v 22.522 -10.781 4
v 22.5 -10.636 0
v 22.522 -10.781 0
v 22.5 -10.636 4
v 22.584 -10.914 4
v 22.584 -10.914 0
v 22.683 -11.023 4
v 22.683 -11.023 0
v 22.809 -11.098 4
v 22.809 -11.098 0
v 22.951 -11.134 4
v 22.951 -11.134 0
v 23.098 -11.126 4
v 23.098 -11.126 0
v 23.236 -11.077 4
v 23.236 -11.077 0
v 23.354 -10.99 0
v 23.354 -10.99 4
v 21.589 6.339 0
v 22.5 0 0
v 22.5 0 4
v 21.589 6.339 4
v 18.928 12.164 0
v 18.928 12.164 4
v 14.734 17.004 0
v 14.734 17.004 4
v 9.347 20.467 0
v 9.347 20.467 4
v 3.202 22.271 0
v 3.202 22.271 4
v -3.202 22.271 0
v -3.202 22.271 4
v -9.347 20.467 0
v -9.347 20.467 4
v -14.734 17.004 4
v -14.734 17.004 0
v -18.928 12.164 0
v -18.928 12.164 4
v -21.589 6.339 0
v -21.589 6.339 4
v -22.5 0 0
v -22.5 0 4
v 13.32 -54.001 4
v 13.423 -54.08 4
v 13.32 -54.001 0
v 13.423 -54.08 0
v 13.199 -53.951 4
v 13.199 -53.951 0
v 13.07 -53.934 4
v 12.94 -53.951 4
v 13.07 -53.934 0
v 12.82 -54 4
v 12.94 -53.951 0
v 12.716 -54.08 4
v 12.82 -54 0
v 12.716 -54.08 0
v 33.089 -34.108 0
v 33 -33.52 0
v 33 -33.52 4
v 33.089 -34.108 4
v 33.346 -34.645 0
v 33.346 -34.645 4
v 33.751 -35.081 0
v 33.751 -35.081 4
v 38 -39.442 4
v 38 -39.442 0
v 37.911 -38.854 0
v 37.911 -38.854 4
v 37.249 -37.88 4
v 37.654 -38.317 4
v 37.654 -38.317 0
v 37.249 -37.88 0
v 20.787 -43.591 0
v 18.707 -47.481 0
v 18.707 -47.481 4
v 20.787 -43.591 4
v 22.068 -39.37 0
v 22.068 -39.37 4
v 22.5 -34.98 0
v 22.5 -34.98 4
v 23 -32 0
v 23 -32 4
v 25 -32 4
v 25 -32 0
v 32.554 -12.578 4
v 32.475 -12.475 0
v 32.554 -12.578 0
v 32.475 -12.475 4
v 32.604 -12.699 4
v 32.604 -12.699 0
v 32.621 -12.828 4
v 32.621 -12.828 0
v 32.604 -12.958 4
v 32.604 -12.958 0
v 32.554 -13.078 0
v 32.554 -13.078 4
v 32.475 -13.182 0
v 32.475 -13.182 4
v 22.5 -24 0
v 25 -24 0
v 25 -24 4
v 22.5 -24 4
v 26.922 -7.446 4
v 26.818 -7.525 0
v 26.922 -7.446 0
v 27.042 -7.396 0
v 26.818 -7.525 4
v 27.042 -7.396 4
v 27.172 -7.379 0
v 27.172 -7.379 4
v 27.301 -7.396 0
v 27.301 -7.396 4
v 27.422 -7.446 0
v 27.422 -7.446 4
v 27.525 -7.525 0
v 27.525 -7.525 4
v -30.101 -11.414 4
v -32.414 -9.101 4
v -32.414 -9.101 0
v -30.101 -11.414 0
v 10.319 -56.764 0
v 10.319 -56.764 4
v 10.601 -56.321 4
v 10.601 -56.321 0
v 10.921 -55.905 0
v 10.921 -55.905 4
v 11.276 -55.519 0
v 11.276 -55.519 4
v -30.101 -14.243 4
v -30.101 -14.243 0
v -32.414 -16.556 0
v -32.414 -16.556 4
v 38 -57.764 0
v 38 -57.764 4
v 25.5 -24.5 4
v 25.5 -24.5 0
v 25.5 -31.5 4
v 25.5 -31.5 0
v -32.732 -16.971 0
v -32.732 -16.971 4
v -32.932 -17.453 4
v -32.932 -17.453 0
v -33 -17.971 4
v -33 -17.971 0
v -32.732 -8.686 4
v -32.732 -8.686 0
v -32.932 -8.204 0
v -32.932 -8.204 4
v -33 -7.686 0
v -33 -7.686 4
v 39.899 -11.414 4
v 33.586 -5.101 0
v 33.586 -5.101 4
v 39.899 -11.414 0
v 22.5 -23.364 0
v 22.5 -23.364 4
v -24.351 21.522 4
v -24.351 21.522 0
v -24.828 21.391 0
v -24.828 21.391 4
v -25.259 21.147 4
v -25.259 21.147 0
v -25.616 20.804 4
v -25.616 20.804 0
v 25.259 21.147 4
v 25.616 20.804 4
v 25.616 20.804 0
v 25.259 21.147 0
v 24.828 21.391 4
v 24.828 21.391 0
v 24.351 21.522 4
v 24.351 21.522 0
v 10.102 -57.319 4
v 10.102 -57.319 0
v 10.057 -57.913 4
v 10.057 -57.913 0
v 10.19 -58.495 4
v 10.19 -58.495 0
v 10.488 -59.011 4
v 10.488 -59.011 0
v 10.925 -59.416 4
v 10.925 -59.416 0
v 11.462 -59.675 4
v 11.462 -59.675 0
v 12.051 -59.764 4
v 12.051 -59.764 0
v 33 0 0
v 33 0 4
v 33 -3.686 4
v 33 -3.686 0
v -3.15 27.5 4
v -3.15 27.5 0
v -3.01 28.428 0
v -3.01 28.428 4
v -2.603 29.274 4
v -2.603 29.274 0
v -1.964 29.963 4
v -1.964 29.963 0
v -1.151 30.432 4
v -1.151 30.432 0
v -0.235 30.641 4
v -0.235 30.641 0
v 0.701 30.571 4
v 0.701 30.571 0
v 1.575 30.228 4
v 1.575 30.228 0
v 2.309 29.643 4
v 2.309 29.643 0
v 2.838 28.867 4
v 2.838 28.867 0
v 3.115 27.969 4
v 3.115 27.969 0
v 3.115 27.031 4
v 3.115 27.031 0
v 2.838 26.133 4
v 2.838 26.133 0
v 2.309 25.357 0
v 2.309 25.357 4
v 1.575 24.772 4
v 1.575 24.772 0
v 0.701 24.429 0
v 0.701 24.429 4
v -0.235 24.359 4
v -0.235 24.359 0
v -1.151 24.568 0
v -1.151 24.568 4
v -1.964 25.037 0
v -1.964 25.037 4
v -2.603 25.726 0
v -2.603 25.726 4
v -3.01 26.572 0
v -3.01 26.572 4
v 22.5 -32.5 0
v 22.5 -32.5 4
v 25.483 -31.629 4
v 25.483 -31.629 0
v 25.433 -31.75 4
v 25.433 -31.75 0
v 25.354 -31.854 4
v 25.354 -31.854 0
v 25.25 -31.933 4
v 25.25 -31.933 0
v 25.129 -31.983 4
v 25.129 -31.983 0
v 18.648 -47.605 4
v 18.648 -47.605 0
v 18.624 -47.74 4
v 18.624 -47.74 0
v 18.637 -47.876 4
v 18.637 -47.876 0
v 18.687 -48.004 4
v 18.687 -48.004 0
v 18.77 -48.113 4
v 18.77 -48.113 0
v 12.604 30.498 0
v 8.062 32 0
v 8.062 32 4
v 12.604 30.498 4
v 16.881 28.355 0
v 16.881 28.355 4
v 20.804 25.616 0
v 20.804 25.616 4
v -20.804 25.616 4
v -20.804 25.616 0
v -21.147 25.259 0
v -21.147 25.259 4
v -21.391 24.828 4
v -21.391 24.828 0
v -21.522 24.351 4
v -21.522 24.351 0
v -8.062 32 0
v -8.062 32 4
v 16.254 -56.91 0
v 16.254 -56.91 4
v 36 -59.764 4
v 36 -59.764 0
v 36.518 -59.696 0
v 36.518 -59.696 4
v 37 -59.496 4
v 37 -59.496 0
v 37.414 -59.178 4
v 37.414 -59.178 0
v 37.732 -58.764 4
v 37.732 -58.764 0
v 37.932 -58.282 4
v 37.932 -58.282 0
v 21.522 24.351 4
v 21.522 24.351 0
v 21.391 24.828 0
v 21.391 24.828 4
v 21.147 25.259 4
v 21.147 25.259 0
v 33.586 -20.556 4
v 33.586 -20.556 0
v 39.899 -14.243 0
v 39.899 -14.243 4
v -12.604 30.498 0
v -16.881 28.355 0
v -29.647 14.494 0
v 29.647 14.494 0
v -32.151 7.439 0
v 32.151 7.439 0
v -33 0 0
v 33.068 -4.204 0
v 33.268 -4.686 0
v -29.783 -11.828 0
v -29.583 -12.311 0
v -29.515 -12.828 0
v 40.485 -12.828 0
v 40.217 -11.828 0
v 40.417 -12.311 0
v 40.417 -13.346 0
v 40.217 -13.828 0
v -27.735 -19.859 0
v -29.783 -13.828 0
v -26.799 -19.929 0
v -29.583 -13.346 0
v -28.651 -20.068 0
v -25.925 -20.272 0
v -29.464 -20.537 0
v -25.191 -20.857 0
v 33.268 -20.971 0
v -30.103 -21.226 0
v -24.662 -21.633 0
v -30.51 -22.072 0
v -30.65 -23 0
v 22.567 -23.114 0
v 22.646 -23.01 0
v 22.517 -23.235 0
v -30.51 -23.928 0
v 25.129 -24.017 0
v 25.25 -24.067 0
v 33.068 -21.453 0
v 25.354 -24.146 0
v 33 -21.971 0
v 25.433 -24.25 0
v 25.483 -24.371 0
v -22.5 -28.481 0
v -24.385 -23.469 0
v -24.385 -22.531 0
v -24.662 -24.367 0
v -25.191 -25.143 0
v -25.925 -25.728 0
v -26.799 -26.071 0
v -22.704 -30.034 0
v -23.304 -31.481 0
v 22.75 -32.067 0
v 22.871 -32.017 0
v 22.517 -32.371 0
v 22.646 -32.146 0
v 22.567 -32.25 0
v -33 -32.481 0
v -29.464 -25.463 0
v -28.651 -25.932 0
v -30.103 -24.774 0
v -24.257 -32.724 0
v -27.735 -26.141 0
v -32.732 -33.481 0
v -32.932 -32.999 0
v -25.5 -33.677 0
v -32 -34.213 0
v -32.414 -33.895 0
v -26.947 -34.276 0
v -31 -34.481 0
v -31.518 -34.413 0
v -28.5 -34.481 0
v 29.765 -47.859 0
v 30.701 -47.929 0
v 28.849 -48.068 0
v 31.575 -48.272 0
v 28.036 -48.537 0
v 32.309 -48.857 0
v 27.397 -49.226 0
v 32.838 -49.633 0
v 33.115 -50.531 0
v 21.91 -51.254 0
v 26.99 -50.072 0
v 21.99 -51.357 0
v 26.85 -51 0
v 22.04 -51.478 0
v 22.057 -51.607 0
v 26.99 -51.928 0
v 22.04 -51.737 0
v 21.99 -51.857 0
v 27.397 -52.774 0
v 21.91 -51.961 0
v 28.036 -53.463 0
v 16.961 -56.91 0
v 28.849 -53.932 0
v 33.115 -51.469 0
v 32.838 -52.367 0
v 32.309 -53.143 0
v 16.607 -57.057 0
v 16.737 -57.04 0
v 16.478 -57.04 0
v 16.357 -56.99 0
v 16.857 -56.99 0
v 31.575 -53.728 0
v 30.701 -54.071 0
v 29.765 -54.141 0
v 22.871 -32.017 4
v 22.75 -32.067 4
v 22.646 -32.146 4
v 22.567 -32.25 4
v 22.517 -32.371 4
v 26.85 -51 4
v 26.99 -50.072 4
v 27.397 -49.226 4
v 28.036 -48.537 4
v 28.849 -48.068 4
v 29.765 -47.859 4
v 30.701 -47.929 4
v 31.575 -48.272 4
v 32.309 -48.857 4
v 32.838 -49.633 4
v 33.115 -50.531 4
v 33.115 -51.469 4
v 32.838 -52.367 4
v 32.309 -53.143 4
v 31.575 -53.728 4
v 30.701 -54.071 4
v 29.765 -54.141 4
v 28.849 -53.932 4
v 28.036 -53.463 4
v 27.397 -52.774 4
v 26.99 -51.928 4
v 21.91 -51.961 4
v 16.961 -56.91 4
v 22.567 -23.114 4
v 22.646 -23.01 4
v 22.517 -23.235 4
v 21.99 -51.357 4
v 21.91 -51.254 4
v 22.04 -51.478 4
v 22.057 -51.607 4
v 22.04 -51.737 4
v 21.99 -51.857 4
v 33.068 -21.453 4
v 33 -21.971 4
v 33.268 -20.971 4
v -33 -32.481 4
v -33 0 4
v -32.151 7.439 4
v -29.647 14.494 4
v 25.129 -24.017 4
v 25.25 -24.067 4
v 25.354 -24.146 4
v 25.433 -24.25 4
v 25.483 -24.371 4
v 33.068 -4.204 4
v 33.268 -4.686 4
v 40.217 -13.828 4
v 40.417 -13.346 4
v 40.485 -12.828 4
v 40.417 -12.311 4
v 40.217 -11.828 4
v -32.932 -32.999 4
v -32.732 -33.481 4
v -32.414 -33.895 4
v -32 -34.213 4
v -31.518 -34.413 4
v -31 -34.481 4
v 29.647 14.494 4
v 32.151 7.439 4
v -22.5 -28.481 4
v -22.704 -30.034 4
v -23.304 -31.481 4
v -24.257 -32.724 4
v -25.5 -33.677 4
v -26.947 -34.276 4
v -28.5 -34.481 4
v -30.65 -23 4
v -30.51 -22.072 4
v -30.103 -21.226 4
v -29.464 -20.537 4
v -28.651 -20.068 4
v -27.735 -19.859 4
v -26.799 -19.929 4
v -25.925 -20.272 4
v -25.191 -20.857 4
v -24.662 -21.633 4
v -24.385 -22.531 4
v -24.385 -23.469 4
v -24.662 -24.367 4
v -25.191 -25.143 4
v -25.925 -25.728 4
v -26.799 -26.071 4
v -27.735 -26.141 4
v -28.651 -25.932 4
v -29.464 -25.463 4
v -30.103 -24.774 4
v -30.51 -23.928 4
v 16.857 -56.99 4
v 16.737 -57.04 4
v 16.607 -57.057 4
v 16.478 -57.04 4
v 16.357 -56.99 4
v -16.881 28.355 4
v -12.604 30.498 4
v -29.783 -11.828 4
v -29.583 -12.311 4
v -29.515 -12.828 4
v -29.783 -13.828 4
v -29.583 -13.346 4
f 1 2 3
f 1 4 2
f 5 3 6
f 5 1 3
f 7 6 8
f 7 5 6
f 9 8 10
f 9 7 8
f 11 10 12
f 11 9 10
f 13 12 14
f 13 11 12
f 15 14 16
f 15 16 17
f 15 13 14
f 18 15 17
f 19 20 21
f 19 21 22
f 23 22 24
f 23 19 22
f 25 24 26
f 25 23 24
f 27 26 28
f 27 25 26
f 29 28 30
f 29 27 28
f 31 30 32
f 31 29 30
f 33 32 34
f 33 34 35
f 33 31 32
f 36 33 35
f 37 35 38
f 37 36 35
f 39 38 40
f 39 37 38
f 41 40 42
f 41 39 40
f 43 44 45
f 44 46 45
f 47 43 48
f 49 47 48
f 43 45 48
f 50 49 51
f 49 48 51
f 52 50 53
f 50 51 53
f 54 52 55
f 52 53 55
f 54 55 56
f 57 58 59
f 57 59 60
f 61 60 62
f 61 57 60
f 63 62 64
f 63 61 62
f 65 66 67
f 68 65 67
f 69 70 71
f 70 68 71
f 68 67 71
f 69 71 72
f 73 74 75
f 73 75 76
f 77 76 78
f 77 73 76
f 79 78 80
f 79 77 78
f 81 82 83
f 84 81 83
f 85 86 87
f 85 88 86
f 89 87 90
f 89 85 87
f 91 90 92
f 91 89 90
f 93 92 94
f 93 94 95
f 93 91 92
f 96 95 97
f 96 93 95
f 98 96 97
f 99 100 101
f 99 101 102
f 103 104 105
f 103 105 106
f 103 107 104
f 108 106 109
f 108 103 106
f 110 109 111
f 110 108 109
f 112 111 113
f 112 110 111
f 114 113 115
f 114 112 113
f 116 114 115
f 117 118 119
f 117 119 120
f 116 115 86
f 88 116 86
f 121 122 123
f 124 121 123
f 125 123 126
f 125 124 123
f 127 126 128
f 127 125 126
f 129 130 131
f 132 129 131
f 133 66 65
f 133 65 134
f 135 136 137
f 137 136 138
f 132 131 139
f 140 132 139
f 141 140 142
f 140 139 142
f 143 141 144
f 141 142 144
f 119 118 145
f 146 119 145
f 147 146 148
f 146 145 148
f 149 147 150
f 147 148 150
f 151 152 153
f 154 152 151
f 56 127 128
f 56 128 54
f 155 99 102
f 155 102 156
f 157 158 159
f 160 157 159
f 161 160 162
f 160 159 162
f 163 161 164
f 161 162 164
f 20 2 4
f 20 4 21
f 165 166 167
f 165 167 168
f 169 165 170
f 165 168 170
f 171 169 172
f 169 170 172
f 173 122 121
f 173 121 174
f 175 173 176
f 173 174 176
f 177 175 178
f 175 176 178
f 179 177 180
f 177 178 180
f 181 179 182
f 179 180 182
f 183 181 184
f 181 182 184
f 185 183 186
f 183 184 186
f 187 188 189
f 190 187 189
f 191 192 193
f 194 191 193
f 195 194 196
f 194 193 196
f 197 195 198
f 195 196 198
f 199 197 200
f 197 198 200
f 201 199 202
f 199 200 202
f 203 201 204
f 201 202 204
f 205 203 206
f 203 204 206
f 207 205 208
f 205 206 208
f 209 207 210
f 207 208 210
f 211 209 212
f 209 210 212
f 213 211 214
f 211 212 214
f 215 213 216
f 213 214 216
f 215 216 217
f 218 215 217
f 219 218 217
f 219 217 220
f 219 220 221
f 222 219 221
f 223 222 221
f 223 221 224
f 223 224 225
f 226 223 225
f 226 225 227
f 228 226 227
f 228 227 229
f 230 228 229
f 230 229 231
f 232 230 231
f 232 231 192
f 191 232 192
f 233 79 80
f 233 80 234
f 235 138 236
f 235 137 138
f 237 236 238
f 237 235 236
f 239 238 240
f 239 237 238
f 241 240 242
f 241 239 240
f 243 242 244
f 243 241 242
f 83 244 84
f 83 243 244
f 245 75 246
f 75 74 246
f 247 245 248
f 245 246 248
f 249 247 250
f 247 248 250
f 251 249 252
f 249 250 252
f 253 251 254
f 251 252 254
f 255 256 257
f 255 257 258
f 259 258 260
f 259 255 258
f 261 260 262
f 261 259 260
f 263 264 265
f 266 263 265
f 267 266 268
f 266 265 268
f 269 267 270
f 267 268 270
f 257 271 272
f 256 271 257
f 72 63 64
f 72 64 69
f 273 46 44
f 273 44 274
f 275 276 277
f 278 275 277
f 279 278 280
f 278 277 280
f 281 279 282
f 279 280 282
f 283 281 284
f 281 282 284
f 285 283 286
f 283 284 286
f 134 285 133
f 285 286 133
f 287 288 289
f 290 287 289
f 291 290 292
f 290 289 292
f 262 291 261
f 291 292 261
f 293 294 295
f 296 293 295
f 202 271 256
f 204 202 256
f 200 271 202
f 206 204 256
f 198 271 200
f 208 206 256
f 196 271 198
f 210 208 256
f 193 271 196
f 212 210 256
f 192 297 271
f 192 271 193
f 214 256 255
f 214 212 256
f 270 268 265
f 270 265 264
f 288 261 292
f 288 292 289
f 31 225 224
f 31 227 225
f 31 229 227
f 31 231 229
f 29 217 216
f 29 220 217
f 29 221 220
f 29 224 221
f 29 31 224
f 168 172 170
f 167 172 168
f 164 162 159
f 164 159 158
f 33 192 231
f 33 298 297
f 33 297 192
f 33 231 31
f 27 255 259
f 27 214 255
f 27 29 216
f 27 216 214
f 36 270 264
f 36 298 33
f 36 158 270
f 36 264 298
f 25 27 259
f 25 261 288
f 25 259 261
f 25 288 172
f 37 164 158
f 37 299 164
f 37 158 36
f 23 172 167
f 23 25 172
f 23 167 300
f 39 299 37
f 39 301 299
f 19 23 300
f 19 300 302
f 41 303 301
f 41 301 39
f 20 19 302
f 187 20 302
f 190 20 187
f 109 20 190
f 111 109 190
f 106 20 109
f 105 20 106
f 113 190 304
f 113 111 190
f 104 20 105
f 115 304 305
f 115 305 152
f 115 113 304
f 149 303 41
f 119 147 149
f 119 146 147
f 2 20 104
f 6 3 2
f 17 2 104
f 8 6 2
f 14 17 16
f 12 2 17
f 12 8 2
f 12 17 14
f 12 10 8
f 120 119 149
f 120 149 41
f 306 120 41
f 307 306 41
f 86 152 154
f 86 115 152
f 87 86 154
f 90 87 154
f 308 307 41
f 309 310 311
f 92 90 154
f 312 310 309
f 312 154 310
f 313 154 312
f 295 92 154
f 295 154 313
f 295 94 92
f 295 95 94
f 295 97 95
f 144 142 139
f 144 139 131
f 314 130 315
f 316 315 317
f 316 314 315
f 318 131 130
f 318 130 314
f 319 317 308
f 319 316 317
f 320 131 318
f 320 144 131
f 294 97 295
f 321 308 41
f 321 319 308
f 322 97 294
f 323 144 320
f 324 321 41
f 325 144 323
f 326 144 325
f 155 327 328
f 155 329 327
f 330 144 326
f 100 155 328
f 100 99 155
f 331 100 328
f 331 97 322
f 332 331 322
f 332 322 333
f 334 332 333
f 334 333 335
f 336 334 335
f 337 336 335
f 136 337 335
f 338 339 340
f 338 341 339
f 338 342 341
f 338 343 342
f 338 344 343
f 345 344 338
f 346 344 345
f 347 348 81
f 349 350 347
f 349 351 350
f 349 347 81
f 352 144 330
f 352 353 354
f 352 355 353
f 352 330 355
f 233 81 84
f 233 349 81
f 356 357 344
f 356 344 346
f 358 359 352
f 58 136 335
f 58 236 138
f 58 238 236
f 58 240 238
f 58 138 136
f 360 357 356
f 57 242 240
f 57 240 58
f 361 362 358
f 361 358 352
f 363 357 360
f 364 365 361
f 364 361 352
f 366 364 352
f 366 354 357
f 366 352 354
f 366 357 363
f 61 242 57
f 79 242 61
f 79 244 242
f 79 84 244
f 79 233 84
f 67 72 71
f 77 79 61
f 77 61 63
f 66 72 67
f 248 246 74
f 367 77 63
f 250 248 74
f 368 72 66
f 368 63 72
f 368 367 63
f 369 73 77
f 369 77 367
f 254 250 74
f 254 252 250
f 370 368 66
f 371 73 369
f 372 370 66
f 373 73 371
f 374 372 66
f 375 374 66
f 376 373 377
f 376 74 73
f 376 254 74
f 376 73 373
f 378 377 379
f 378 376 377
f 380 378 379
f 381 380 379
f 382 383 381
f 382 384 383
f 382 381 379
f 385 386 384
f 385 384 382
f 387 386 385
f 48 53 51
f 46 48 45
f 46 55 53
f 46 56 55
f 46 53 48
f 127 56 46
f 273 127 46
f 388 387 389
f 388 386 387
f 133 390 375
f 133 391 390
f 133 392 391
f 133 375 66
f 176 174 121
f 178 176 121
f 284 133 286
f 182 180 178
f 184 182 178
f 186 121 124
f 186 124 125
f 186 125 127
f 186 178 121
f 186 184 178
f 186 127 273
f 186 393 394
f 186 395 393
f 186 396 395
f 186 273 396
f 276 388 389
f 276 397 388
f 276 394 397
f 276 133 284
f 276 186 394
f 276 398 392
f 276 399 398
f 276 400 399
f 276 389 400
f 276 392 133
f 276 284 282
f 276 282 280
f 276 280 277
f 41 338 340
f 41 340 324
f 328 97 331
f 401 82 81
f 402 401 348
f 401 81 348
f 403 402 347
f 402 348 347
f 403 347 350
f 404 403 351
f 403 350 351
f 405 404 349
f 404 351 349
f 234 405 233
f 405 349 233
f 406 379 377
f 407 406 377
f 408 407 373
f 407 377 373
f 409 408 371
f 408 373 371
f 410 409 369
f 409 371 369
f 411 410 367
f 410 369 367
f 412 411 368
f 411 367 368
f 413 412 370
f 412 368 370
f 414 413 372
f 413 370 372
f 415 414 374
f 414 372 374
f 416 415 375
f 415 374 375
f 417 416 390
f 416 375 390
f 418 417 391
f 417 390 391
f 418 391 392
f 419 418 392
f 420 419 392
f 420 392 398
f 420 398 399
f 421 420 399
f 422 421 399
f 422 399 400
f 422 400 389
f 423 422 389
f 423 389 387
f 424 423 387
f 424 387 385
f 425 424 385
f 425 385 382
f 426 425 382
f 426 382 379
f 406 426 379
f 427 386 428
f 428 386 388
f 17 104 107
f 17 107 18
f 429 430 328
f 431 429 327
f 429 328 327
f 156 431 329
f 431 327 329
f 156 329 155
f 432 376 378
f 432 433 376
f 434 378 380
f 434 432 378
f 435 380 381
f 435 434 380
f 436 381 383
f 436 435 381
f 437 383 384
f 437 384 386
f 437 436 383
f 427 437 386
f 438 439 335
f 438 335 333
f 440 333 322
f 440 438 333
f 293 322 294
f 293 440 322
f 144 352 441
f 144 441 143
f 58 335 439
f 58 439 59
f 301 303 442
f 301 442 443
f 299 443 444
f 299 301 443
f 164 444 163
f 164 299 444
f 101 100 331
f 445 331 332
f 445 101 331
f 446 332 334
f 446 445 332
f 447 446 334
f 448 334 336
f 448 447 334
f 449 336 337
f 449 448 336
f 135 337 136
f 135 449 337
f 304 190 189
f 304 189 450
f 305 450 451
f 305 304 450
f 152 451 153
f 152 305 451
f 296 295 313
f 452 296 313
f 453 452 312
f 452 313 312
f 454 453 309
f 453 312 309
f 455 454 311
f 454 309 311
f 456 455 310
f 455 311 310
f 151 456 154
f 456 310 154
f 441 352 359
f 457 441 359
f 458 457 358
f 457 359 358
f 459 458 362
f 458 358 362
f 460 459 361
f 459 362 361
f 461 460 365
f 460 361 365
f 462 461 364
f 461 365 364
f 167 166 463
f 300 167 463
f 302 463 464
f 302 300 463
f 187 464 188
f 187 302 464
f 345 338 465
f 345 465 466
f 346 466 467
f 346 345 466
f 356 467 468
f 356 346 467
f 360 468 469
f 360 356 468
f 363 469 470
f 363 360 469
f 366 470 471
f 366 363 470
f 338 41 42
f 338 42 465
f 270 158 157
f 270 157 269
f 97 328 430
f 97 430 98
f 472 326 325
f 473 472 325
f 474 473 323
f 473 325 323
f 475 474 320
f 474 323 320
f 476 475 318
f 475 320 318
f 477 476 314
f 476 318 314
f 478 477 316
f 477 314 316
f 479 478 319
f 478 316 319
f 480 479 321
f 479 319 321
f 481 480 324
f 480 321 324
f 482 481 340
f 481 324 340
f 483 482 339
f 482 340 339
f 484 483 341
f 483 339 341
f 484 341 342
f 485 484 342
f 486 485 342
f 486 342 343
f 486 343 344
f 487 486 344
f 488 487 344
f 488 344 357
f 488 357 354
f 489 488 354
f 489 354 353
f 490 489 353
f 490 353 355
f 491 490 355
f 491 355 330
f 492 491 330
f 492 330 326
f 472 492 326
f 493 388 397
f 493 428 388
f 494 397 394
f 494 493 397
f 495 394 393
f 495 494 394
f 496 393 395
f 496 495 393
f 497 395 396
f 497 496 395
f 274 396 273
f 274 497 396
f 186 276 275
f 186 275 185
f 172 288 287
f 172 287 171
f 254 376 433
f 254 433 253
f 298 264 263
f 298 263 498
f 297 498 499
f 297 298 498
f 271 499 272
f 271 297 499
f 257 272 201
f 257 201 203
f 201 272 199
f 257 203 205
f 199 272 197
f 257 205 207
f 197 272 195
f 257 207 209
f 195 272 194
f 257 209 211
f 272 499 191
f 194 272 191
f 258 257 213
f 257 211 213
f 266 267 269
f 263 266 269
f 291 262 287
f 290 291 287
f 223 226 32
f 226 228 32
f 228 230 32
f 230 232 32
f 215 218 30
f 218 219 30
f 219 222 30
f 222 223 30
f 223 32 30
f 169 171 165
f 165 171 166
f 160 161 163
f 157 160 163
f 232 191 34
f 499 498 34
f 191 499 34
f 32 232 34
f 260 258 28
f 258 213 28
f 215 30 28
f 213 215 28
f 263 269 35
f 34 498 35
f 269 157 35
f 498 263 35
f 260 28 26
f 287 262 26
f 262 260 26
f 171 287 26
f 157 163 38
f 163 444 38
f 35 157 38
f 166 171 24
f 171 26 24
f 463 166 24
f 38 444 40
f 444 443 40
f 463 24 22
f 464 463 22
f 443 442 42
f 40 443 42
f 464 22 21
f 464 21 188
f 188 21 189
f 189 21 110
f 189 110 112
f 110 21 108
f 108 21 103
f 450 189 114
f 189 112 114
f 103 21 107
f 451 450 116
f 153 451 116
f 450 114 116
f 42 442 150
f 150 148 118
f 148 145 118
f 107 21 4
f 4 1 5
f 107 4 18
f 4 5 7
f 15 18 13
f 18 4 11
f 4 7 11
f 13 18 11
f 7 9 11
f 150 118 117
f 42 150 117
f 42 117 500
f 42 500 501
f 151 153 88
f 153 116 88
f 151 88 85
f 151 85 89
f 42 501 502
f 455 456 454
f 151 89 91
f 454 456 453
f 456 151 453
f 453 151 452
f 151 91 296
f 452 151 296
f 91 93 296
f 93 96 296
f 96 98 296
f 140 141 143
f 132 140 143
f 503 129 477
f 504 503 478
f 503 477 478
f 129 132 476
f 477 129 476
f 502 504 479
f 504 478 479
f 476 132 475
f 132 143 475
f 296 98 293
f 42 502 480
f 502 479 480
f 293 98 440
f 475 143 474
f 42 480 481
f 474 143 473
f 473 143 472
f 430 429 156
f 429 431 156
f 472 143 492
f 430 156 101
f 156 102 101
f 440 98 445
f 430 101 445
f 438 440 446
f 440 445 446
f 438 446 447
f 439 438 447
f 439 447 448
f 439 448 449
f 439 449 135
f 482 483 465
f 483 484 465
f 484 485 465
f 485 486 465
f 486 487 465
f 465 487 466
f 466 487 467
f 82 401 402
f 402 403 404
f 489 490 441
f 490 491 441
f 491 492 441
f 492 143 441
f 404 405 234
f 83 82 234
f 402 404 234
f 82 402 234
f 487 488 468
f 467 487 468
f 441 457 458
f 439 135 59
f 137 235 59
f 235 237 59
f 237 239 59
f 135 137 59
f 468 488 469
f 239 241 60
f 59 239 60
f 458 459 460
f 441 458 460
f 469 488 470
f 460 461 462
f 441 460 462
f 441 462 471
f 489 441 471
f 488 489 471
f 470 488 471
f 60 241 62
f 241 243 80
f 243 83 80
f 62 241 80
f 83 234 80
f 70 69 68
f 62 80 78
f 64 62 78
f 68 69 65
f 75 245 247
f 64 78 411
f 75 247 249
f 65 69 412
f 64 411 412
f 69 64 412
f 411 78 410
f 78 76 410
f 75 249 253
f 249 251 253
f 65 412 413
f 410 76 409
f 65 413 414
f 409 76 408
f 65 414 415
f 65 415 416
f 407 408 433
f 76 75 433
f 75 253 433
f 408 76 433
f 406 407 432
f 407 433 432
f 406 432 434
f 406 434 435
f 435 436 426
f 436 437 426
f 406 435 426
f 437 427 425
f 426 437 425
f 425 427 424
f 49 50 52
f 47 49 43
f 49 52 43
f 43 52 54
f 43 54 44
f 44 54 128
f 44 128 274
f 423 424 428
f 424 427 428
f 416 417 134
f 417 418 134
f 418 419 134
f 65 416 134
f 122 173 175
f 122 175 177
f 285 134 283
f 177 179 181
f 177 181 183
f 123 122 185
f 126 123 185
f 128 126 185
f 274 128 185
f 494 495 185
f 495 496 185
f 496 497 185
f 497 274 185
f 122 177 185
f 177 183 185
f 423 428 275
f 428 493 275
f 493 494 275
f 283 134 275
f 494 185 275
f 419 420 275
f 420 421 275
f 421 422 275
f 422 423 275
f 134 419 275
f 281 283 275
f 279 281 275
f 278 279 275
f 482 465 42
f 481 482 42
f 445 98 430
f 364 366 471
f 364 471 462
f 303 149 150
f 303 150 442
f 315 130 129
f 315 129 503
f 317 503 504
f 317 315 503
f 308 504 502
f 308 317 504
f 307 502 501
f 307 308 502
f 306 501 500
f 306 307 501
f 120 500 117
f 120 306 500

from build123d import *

# Parameters (mm, degrees)
CORPS_DEPTH                     = 4
DIAM_TRE_DU_PER_AGE_6_2_6_3_1_D = 6.3
RENFORT_CAVITE_IR_DEPTH         = 4
CAVITE_IR_DEPTH                 = 73.7636828920554
CAVITE_SWITCH_DEPTH             = 73.7636828920554
CONG_1_R                        = 2
CONG_2_R                        = 0.5


with BuildPart() as part:
    # Esquisse1 → corps (new body)
    with BuildSketch(Plane.XY):
        with BuildLine():
            Line((-21.522272155725624, 24.35069928047194), (-21.522272155725624, 25.01583101267831))
            ThreePointArc((-21.522272155725624, 25.01583101267831), (-15.198873528041206, 29.291538769388826), (-8.062257748298553, 32))
            Line((-8.062257748298553, 32), (8.062257748298553, 32))
            ThreePointArc((8.062257748298553, 32), (15.198873528041206, 29.29153876938882), (21.522272155725624, 25.015831012678305))
            Line((21.522272155725624, 25.015831012678305), (21.522272155725624, 24.350699280471943))
            Line((21.522272155725624, 24.350699280471943), (24.35069928047182, 21.522272155725762))
            Line((24.35069928047182, 21.522272155725762), (25.015831012678188, 21.522272155725762))
            ThreePointArc((25.015831012678188, 21.522272155725762), (30.93963819615851, 11.477751883135042), (33, 0))
            Line((33, 0), (33, -34.48090133377067))
            Line((33, -34.48090133377067), (38, -38.48090133377066))
            Line((38, -38.48090133377066), (38, -59.76396103067893))
            Line((38, -59.76396103067893), (9.515567427896173, -59.76396103067893))
            ThreePointArc((9.515567427896173, -59.76396103067893), (9.973004843675767, -57.46613597206372), (11.275567427896174, -55.51868129902402))
            Line((11.275567427896174, -55.51868129902402), (15.9, -50.9))
            ThreePointArc((15.9, -50.9), (20.78460969082653, -43.597044976101124), (22.500000000000004, -34.98020100629408))
            Line((22.500000000000004, -34.98020100629408), (22.5, 0))
            ThreePointArc((22.5, 0), (1.38e-15, 22.5), (-22.5, 0))
            Line((-22.5, 0), (-22.5, -28.480901333770667))
            ThreePointArc((-22.5, -28.480901333770667), (-24.257359312880713, -32.723542020889944), (-28.499999999999993, -34.48090133377067))
            Line((-28.499999999999993, -34.48090133377067), (-33, -34.48090133377067))
            Line((-33, -34.48090133377067), (-33, 0))
            ThreePointArc((-33, 0), (-30.939638196158512, 11.477751883135037), (-25.015831012678195, 21.522272155725755))
            Line((-25.015831012678195, 21.522272155725755), (-24.35069928047182, 21.52227215572576))
            Line((-24.35069928047182, 21.52227215572576), (-21.522272155725624, 24.35069928047194))
        make_face()
    extrude(amount=CORPS_DEPTH)

    # Diamètre du perçage Ø6.2 (6.3)1 (through all)
    with Locations(Plane.XY.offset(4)):
        with Locations((0, 27.5), (30, -51), (-27.5, -23)):
            Hole(DIAM_TRE_DU_PER_AGE_6_2_6_3_1_D / 2)

    # Esquisse4 → renfort_cavite_IR (add, through all)
    with BuildSketch(Plane.XY):
        Polygon((31.414213562373053, -2.928932188134515), (41.313708498984774, -12.828427124746126), (34.525483399593966, -19.61665222413702), (27.454415587728445, -26.68772003600261), (24.62598846298224, -9.717157287525408), align=None)
    extrude(amount=RENFORT_CAVITE_IR_DEPTH)

    # Esquisse4<4> → cavite_IR (cut, through all)
    with BuildSketch(Plane.XY):
        Polygon((4.3e-16, -34.34314575050794), (24.62598846298224, -9.717157287525408), (27.17157287525379, -7.171572875253825), (32.828427124746206, -12.828427124746176), (30.282842712474658, -15.37401153701776), (1.73e-15, -45.65685424949275), align=None)
        Polygon((-75.93969696196702, -31.797561338236385), (-42.82842712474626, 1.313708498984752), (-28.686291501015212, -12.828427124746126), (-61.79756133823598, -45.93969696196728), align=None)
    extrude(amount=CAVITE_IR_DEPTH, mode=Mode.SUBTRACT)

    # Esquisse5 → cavite_switch (cut, through all)
    with BuildSketch(Plane.XY):
        Polygon((18.90520382004283, -48.24834957055045), (21.910407640085666, -51.25355339059327), (22.263961030678935, -51.607106781186545), (16.607106781186562, -57.26396103067893), (16.253553390593282, -56.910407640085644), (13.24834957055045, -53.905203820042814), (12.894796179957178, -53.551650429449545), (11.671501448504449, -52.32835569799682), (17.32835569799682, -46.671501448504436), (18.55165042944955, -47.89479617995717), align=None)
        Polygon((20.249999999999996, -31.999999999999993), (18.51999999999999, -32), (18.51999999999999, -23.999999999999993), (20.249999999999996, -23.999999999999996), (20.750000000000007, -23.99999999999999), (25.000000000000007, -23.99999999999999), (25.50000000000001, -24), (25.500000000000007, -32), (25.00000000000001, -32), (20.750000000000007, -32), align=None)
    extrude(amount=CAVITE_SWITCH_DEPTH, mode=Mode.SUBTRACT)

    # Congé1
    # the kernel refuses this fillet: 2 mm, written as the material it adds along each edge
    with BuildSketch(Plane(origin=(33, -4.514718625761442, 0), x_dir=(0.7071067811865507, -0.7071067811865442, 0), z_dir=(0, 0, 1))) as cong_1_piece_1:
        with BuildLine():
            CenterArc((CONG_1_R * 0.414213562373, CONG_1_R), CONG_1_R, 224.99999999999966, 45.000000000000455)
            Line((-CONG_1_R * 0.292893218813, CONG_1_R * 0.292893218813), (0, 0))
            Line((0, 0), (CONG_1_R * 0.414213562373, 1e-17))
        make_face()
    extrude(amount=4)
    with BuildSketch(Plane(origin=(33, -21.142135623731004, 4), x_dir=(0, -1, 0), z_dir=(0, 0, -1))) as cong_1_piece_2:
        with BuildLine():
            CenterArc((CONG_1_R * 0.414213562373, -CONG_1_R), CONG_1_R, 90, 44.999999999999574)
            Line((-CONG_1_R * 0.292893218813, -CONG_1_R * 0.292893218813), (0, 0))
            Line((0, 0), (CONG_1_R * 0.414213562373, 0))
        make_face()
    extrude(amount=4)
    with BuildSketch(Plane(origin=(33, -34.48090133377067, 0), x_dir=(0.7808688094430318, -0.6246950475544225, 0), z_dir=(0, 0, 1))) as cong_1_piece_3:
        with BuildLine():
            CenterArc((CONG_1_R * 0.480624847487, CONG_1_R), CONG_1_R, 218.65980825408994, 51.34019174590992)
            Line((-CONG_1_R * 0.300243961956, CONG_1_R * 0.375304952446), (0, 0))
            Line((0, 0), (CONG_1_R * 0.480624847487, 1e-17))
        make_face()
    extrude(amount=4)
    with BuildSketch(Plane(origin=(-28.686291501015212, -12.828427124746126, 0), x_dir=(-0.7071067811865511, 0.707106781186544, 0), z_dir=(0, 0, 1))) as cong_1_piece_4:
        with BuildLine():
            CenterArc((CONG_1_R, CONG_1_R), CONG_1_R, 179.9999999999999, 90.00000000000023)
            Line((-7.52e-15, CONG_1_R), (0, 0))
            Line((0, 0), (CONG_1_R, 2e-17))
        make_face()
    extrude(amount=4)
    # the kernel refuses this fillet: 2 mm, written as the material it takes off along each edge
    with BuildSketch(Plane(origin=(-25.0158310126782, 21.52227215572575, -2.3412126230346395), x_dir=(1, 0, 0), z_dir=(0, 0, 1))) as cong_1_2_piece_1:
        with BuildLine():
            CenterArc((0.9518811347481559, -1.979336954674956), CONG_1_R, 98.24317304928408, 42.67591267968572)
            ThreePointArc((-0.6006317606021696, -0.7185024255749006), (-0.30286474640058003, -0.35712048938501084), (0, 0))
            Line((0, 0), (0.6651317322063797, 0))
        make_face()
    extrude(amount=8.682425246069279, mode=Mode.SUBTRACT)
    with BuildSketch(Plane(origin=(-21.522272155725624, 25.015831012678312, -2.341212623034707), x_dir=(0.7672332048205719, 0.6413682323133525, 0), z_dir=(0, 0, 1))) as cong_1_2_piece_2:
        with BuildLine():
            CenterArc((0.9081067143892164, -1.9997986573934323), CONG_1_R, 89.18699331013795, 42.675912679686405)
            Line((-0.4265943633407193, -0.5103111505285536), (0, 0))
            ThreePointArc((0, 0), (0.46824252460693927, 0.00332215300834937), (0.936485049213883, -9e-17))
        make_face()
    extrude(amount=8.682425246069414, mode=Mode.SUBTRACT)
    with BuildSketch(Plane(origin=(25.015831012678184, 21.522272155725762, -2.341212623034682), x_dir=(0.6413682323133517, -0.7672332048205726, 0), z_dir=(0, 0, 1))) as cong_1_2_piece_3:
        with BuildLine():
            CenterArc((0.9081067143892213, -1.9997986573934339), CONG_1_R, 89.18699331013839, 42.67591267968582)
            Line((-0.42659436334071155, -0.5103111505285509), (0, 0))
            ThreePointArc((0, 0), (0.46824252460693927, 0.00332215300834983), (0.936485049213873, -2e-17))
        make_face()
    extrude(amount=8.682425246069364, mode=Mode.SUBTRACT)
    with BuildSketch(Plane(origin=(21.522272155725624, 25.015831012678305, -2.3412126230346706), x_dir=(5.34e-15, -1, 0), z_dir=(0, 0, 1))) as cong_1_2_piece_4:
        with BuildLine():
            CenterArc((0.9518811347481454, -1.9793369546749575), CONG_1_R, 98.24317304928427, 42.67591267968571)
            ThreePointArc((-0.6006317606021806, -0.7185024255749081), (-0.30286474640058547, -0.3571204893850199), (0, 0))
            Line((0, 0), (0.6651317322063619, 0))
        make_face()
    extrude(amount=8.682425246069341, mode=Mode.SUBTRACT)
    with BuildSketch(Plane(origin=(41.313708498984774, -12.828427124746126, -4.999999999999984), x_dir=(-0.7071067811865427, -0.7071067811865525, 0), z_dir=(0, 0, 1))) as cong_1_2_piece_5:
        with BuildLine():
            CenterArc((CONG_1_R, -CONG_1_R), CONG_1_R, 90.00000000000004, 89.99999999999976)
            Line((-1.126e-14, -CONG_1_R), (0, 0))
            Line((0, 0), (CONG_1_R, -5e-17))
        make_face()
    extrude(amount=13.999999999999968, mode=Mode.SUBTRACT)
    with BuildSketch(Plane(origin=(38, -38.48090133377066, -2.403124237432852), x_dir=(0, -1, 0), z_dir=(0, 0, 1))) as cong_1_2_piece_6:
        with BuildLine():
            CenterArc((CONG_1_R * 0.480624847487, -CONG_1_R), CONG_1_R, 90, 51.340191745909806)
            Line((-CONG_1_R * 0.300243961956, -CONG_1_R * 0.375304952446), (0, 0))
            Line((0, 0), (CONG_1_R * 0.480624847487, 0))
        make_face()
    extrude(amount=8.806248474865704, mode=Mode.SUBTRACT)
    with BuildSketch(Plane(origin=(38, -59.76396103067893, -5), x_dir=(-1, 0, 0), z_dir=(0, 0, 1)), Plane(origin=(-33, -34.48090133377067, -5), x_dir=(0, 1, 0), z_dir=(0, 0, 1))) as cong_1_2_piece_7:
        with BuildLine():
            CenterArc((CONG_1_R, -CONG_1_R), CONG_1_R, 90, 90)
            Line((0, -CONG_1_R), (0, 0))
            Line((0, 0), (CONG_1_R, 0))
        make_face()
    extrude(amount=14, mode=Mode.SUBTRACT)
    with BuildSketch(Plane(origin=(9.515567427896173, -59.76396103067893, -7.764571353075624), x_dir=(1, 0, 0), z_dir=(0, 0, 1))) as cong_1_2_piece_8:
        with BuildLine():
            CenterArc((2.5358983848622465, 2), CONG_1_R, 150, 120)
            ThreePointArc((0.8038475772933698, 3), (0.20444504226559168, 1.5529142706151262), (0, 0))
            Line((0, 0), (2.5358983848622465, 0))
        make_face()
    extrude(amount=19.529142706151248, mode=Mode.SUBTRACT)
    with BuildSketch(Plane(origin=(-33, -17.142135623730965, -2.0710678118654613), x_dir=(0.7071067811865432, 0.7071067811865518, 0), z_dir=(0, 0, 1))) as cong_1_2_piece_9:
        with BuildLine():
            CenterArc((CONG_1_R * 0.414213562373, -CONG_1_R), CONG_1_R, 90.00000000000003, 44.99999999999963)
            Line((-CONG_1_R * 0.292893218813, -CONG_1_R * 0.292893218813), (0, 0))
            Line((0, 0), (CONG_1_R * 0.414213562373, 1e-17))
        make_face()
    extrude(amount=8.142135623730923, mode=Mode.SUBTRACT)
    with BuildSketch(Plane(origin=(-33, -8.51471862576139, 6.071067811865498), x_dir=(0, 1, 0), z_dir=(0, 0, -1))) as cong_1_2_piece_10:
        with BuildLine():
            CenterArc((CONG_1_R * 0.414213562373, CONG_1_R), CONG_1_R, 224.99999999999957, 45.000000000000455)
            Line((-CONG_1_R * 0.292893218813, CONG_1_R * 0.292893218813), (0, 0))
            Line((0, 0), (CONG_1_R * 0.414213562373, 0))
        make_face()
    extrude(amount=8.142135623730995, mode=Mode.SUBTRACT)

    # Congé2
    cong_2_edges = [part.edges().sort_by_distance(p)[0] for p in [
        (22.500000000000007, -11.843145750507656, 2),
        (27.17157287525379, -7.171572875253825, 2),
        (22.500000000000004, -23.15685424949253, 2),
        (32.828427124746206, -12.828427124746176, 2),
        (13.069812964361518, -53.726667213853844, 2),
        (18.47678110683533, -47.81992685734296, 2),
        (22.263961030678935, -51.607106781186545, 2),
        (16.607106781186562, -57.26396103067893, 2),
        (25.50000000000001, -24, 2),
        (22.500000000000004, -31.999999999999986, 2),
        (25.500000000000007, -32, 2),
    ]]
    fillet(cong_2_edges, radius=CONG_2_R)


solid = part.part
